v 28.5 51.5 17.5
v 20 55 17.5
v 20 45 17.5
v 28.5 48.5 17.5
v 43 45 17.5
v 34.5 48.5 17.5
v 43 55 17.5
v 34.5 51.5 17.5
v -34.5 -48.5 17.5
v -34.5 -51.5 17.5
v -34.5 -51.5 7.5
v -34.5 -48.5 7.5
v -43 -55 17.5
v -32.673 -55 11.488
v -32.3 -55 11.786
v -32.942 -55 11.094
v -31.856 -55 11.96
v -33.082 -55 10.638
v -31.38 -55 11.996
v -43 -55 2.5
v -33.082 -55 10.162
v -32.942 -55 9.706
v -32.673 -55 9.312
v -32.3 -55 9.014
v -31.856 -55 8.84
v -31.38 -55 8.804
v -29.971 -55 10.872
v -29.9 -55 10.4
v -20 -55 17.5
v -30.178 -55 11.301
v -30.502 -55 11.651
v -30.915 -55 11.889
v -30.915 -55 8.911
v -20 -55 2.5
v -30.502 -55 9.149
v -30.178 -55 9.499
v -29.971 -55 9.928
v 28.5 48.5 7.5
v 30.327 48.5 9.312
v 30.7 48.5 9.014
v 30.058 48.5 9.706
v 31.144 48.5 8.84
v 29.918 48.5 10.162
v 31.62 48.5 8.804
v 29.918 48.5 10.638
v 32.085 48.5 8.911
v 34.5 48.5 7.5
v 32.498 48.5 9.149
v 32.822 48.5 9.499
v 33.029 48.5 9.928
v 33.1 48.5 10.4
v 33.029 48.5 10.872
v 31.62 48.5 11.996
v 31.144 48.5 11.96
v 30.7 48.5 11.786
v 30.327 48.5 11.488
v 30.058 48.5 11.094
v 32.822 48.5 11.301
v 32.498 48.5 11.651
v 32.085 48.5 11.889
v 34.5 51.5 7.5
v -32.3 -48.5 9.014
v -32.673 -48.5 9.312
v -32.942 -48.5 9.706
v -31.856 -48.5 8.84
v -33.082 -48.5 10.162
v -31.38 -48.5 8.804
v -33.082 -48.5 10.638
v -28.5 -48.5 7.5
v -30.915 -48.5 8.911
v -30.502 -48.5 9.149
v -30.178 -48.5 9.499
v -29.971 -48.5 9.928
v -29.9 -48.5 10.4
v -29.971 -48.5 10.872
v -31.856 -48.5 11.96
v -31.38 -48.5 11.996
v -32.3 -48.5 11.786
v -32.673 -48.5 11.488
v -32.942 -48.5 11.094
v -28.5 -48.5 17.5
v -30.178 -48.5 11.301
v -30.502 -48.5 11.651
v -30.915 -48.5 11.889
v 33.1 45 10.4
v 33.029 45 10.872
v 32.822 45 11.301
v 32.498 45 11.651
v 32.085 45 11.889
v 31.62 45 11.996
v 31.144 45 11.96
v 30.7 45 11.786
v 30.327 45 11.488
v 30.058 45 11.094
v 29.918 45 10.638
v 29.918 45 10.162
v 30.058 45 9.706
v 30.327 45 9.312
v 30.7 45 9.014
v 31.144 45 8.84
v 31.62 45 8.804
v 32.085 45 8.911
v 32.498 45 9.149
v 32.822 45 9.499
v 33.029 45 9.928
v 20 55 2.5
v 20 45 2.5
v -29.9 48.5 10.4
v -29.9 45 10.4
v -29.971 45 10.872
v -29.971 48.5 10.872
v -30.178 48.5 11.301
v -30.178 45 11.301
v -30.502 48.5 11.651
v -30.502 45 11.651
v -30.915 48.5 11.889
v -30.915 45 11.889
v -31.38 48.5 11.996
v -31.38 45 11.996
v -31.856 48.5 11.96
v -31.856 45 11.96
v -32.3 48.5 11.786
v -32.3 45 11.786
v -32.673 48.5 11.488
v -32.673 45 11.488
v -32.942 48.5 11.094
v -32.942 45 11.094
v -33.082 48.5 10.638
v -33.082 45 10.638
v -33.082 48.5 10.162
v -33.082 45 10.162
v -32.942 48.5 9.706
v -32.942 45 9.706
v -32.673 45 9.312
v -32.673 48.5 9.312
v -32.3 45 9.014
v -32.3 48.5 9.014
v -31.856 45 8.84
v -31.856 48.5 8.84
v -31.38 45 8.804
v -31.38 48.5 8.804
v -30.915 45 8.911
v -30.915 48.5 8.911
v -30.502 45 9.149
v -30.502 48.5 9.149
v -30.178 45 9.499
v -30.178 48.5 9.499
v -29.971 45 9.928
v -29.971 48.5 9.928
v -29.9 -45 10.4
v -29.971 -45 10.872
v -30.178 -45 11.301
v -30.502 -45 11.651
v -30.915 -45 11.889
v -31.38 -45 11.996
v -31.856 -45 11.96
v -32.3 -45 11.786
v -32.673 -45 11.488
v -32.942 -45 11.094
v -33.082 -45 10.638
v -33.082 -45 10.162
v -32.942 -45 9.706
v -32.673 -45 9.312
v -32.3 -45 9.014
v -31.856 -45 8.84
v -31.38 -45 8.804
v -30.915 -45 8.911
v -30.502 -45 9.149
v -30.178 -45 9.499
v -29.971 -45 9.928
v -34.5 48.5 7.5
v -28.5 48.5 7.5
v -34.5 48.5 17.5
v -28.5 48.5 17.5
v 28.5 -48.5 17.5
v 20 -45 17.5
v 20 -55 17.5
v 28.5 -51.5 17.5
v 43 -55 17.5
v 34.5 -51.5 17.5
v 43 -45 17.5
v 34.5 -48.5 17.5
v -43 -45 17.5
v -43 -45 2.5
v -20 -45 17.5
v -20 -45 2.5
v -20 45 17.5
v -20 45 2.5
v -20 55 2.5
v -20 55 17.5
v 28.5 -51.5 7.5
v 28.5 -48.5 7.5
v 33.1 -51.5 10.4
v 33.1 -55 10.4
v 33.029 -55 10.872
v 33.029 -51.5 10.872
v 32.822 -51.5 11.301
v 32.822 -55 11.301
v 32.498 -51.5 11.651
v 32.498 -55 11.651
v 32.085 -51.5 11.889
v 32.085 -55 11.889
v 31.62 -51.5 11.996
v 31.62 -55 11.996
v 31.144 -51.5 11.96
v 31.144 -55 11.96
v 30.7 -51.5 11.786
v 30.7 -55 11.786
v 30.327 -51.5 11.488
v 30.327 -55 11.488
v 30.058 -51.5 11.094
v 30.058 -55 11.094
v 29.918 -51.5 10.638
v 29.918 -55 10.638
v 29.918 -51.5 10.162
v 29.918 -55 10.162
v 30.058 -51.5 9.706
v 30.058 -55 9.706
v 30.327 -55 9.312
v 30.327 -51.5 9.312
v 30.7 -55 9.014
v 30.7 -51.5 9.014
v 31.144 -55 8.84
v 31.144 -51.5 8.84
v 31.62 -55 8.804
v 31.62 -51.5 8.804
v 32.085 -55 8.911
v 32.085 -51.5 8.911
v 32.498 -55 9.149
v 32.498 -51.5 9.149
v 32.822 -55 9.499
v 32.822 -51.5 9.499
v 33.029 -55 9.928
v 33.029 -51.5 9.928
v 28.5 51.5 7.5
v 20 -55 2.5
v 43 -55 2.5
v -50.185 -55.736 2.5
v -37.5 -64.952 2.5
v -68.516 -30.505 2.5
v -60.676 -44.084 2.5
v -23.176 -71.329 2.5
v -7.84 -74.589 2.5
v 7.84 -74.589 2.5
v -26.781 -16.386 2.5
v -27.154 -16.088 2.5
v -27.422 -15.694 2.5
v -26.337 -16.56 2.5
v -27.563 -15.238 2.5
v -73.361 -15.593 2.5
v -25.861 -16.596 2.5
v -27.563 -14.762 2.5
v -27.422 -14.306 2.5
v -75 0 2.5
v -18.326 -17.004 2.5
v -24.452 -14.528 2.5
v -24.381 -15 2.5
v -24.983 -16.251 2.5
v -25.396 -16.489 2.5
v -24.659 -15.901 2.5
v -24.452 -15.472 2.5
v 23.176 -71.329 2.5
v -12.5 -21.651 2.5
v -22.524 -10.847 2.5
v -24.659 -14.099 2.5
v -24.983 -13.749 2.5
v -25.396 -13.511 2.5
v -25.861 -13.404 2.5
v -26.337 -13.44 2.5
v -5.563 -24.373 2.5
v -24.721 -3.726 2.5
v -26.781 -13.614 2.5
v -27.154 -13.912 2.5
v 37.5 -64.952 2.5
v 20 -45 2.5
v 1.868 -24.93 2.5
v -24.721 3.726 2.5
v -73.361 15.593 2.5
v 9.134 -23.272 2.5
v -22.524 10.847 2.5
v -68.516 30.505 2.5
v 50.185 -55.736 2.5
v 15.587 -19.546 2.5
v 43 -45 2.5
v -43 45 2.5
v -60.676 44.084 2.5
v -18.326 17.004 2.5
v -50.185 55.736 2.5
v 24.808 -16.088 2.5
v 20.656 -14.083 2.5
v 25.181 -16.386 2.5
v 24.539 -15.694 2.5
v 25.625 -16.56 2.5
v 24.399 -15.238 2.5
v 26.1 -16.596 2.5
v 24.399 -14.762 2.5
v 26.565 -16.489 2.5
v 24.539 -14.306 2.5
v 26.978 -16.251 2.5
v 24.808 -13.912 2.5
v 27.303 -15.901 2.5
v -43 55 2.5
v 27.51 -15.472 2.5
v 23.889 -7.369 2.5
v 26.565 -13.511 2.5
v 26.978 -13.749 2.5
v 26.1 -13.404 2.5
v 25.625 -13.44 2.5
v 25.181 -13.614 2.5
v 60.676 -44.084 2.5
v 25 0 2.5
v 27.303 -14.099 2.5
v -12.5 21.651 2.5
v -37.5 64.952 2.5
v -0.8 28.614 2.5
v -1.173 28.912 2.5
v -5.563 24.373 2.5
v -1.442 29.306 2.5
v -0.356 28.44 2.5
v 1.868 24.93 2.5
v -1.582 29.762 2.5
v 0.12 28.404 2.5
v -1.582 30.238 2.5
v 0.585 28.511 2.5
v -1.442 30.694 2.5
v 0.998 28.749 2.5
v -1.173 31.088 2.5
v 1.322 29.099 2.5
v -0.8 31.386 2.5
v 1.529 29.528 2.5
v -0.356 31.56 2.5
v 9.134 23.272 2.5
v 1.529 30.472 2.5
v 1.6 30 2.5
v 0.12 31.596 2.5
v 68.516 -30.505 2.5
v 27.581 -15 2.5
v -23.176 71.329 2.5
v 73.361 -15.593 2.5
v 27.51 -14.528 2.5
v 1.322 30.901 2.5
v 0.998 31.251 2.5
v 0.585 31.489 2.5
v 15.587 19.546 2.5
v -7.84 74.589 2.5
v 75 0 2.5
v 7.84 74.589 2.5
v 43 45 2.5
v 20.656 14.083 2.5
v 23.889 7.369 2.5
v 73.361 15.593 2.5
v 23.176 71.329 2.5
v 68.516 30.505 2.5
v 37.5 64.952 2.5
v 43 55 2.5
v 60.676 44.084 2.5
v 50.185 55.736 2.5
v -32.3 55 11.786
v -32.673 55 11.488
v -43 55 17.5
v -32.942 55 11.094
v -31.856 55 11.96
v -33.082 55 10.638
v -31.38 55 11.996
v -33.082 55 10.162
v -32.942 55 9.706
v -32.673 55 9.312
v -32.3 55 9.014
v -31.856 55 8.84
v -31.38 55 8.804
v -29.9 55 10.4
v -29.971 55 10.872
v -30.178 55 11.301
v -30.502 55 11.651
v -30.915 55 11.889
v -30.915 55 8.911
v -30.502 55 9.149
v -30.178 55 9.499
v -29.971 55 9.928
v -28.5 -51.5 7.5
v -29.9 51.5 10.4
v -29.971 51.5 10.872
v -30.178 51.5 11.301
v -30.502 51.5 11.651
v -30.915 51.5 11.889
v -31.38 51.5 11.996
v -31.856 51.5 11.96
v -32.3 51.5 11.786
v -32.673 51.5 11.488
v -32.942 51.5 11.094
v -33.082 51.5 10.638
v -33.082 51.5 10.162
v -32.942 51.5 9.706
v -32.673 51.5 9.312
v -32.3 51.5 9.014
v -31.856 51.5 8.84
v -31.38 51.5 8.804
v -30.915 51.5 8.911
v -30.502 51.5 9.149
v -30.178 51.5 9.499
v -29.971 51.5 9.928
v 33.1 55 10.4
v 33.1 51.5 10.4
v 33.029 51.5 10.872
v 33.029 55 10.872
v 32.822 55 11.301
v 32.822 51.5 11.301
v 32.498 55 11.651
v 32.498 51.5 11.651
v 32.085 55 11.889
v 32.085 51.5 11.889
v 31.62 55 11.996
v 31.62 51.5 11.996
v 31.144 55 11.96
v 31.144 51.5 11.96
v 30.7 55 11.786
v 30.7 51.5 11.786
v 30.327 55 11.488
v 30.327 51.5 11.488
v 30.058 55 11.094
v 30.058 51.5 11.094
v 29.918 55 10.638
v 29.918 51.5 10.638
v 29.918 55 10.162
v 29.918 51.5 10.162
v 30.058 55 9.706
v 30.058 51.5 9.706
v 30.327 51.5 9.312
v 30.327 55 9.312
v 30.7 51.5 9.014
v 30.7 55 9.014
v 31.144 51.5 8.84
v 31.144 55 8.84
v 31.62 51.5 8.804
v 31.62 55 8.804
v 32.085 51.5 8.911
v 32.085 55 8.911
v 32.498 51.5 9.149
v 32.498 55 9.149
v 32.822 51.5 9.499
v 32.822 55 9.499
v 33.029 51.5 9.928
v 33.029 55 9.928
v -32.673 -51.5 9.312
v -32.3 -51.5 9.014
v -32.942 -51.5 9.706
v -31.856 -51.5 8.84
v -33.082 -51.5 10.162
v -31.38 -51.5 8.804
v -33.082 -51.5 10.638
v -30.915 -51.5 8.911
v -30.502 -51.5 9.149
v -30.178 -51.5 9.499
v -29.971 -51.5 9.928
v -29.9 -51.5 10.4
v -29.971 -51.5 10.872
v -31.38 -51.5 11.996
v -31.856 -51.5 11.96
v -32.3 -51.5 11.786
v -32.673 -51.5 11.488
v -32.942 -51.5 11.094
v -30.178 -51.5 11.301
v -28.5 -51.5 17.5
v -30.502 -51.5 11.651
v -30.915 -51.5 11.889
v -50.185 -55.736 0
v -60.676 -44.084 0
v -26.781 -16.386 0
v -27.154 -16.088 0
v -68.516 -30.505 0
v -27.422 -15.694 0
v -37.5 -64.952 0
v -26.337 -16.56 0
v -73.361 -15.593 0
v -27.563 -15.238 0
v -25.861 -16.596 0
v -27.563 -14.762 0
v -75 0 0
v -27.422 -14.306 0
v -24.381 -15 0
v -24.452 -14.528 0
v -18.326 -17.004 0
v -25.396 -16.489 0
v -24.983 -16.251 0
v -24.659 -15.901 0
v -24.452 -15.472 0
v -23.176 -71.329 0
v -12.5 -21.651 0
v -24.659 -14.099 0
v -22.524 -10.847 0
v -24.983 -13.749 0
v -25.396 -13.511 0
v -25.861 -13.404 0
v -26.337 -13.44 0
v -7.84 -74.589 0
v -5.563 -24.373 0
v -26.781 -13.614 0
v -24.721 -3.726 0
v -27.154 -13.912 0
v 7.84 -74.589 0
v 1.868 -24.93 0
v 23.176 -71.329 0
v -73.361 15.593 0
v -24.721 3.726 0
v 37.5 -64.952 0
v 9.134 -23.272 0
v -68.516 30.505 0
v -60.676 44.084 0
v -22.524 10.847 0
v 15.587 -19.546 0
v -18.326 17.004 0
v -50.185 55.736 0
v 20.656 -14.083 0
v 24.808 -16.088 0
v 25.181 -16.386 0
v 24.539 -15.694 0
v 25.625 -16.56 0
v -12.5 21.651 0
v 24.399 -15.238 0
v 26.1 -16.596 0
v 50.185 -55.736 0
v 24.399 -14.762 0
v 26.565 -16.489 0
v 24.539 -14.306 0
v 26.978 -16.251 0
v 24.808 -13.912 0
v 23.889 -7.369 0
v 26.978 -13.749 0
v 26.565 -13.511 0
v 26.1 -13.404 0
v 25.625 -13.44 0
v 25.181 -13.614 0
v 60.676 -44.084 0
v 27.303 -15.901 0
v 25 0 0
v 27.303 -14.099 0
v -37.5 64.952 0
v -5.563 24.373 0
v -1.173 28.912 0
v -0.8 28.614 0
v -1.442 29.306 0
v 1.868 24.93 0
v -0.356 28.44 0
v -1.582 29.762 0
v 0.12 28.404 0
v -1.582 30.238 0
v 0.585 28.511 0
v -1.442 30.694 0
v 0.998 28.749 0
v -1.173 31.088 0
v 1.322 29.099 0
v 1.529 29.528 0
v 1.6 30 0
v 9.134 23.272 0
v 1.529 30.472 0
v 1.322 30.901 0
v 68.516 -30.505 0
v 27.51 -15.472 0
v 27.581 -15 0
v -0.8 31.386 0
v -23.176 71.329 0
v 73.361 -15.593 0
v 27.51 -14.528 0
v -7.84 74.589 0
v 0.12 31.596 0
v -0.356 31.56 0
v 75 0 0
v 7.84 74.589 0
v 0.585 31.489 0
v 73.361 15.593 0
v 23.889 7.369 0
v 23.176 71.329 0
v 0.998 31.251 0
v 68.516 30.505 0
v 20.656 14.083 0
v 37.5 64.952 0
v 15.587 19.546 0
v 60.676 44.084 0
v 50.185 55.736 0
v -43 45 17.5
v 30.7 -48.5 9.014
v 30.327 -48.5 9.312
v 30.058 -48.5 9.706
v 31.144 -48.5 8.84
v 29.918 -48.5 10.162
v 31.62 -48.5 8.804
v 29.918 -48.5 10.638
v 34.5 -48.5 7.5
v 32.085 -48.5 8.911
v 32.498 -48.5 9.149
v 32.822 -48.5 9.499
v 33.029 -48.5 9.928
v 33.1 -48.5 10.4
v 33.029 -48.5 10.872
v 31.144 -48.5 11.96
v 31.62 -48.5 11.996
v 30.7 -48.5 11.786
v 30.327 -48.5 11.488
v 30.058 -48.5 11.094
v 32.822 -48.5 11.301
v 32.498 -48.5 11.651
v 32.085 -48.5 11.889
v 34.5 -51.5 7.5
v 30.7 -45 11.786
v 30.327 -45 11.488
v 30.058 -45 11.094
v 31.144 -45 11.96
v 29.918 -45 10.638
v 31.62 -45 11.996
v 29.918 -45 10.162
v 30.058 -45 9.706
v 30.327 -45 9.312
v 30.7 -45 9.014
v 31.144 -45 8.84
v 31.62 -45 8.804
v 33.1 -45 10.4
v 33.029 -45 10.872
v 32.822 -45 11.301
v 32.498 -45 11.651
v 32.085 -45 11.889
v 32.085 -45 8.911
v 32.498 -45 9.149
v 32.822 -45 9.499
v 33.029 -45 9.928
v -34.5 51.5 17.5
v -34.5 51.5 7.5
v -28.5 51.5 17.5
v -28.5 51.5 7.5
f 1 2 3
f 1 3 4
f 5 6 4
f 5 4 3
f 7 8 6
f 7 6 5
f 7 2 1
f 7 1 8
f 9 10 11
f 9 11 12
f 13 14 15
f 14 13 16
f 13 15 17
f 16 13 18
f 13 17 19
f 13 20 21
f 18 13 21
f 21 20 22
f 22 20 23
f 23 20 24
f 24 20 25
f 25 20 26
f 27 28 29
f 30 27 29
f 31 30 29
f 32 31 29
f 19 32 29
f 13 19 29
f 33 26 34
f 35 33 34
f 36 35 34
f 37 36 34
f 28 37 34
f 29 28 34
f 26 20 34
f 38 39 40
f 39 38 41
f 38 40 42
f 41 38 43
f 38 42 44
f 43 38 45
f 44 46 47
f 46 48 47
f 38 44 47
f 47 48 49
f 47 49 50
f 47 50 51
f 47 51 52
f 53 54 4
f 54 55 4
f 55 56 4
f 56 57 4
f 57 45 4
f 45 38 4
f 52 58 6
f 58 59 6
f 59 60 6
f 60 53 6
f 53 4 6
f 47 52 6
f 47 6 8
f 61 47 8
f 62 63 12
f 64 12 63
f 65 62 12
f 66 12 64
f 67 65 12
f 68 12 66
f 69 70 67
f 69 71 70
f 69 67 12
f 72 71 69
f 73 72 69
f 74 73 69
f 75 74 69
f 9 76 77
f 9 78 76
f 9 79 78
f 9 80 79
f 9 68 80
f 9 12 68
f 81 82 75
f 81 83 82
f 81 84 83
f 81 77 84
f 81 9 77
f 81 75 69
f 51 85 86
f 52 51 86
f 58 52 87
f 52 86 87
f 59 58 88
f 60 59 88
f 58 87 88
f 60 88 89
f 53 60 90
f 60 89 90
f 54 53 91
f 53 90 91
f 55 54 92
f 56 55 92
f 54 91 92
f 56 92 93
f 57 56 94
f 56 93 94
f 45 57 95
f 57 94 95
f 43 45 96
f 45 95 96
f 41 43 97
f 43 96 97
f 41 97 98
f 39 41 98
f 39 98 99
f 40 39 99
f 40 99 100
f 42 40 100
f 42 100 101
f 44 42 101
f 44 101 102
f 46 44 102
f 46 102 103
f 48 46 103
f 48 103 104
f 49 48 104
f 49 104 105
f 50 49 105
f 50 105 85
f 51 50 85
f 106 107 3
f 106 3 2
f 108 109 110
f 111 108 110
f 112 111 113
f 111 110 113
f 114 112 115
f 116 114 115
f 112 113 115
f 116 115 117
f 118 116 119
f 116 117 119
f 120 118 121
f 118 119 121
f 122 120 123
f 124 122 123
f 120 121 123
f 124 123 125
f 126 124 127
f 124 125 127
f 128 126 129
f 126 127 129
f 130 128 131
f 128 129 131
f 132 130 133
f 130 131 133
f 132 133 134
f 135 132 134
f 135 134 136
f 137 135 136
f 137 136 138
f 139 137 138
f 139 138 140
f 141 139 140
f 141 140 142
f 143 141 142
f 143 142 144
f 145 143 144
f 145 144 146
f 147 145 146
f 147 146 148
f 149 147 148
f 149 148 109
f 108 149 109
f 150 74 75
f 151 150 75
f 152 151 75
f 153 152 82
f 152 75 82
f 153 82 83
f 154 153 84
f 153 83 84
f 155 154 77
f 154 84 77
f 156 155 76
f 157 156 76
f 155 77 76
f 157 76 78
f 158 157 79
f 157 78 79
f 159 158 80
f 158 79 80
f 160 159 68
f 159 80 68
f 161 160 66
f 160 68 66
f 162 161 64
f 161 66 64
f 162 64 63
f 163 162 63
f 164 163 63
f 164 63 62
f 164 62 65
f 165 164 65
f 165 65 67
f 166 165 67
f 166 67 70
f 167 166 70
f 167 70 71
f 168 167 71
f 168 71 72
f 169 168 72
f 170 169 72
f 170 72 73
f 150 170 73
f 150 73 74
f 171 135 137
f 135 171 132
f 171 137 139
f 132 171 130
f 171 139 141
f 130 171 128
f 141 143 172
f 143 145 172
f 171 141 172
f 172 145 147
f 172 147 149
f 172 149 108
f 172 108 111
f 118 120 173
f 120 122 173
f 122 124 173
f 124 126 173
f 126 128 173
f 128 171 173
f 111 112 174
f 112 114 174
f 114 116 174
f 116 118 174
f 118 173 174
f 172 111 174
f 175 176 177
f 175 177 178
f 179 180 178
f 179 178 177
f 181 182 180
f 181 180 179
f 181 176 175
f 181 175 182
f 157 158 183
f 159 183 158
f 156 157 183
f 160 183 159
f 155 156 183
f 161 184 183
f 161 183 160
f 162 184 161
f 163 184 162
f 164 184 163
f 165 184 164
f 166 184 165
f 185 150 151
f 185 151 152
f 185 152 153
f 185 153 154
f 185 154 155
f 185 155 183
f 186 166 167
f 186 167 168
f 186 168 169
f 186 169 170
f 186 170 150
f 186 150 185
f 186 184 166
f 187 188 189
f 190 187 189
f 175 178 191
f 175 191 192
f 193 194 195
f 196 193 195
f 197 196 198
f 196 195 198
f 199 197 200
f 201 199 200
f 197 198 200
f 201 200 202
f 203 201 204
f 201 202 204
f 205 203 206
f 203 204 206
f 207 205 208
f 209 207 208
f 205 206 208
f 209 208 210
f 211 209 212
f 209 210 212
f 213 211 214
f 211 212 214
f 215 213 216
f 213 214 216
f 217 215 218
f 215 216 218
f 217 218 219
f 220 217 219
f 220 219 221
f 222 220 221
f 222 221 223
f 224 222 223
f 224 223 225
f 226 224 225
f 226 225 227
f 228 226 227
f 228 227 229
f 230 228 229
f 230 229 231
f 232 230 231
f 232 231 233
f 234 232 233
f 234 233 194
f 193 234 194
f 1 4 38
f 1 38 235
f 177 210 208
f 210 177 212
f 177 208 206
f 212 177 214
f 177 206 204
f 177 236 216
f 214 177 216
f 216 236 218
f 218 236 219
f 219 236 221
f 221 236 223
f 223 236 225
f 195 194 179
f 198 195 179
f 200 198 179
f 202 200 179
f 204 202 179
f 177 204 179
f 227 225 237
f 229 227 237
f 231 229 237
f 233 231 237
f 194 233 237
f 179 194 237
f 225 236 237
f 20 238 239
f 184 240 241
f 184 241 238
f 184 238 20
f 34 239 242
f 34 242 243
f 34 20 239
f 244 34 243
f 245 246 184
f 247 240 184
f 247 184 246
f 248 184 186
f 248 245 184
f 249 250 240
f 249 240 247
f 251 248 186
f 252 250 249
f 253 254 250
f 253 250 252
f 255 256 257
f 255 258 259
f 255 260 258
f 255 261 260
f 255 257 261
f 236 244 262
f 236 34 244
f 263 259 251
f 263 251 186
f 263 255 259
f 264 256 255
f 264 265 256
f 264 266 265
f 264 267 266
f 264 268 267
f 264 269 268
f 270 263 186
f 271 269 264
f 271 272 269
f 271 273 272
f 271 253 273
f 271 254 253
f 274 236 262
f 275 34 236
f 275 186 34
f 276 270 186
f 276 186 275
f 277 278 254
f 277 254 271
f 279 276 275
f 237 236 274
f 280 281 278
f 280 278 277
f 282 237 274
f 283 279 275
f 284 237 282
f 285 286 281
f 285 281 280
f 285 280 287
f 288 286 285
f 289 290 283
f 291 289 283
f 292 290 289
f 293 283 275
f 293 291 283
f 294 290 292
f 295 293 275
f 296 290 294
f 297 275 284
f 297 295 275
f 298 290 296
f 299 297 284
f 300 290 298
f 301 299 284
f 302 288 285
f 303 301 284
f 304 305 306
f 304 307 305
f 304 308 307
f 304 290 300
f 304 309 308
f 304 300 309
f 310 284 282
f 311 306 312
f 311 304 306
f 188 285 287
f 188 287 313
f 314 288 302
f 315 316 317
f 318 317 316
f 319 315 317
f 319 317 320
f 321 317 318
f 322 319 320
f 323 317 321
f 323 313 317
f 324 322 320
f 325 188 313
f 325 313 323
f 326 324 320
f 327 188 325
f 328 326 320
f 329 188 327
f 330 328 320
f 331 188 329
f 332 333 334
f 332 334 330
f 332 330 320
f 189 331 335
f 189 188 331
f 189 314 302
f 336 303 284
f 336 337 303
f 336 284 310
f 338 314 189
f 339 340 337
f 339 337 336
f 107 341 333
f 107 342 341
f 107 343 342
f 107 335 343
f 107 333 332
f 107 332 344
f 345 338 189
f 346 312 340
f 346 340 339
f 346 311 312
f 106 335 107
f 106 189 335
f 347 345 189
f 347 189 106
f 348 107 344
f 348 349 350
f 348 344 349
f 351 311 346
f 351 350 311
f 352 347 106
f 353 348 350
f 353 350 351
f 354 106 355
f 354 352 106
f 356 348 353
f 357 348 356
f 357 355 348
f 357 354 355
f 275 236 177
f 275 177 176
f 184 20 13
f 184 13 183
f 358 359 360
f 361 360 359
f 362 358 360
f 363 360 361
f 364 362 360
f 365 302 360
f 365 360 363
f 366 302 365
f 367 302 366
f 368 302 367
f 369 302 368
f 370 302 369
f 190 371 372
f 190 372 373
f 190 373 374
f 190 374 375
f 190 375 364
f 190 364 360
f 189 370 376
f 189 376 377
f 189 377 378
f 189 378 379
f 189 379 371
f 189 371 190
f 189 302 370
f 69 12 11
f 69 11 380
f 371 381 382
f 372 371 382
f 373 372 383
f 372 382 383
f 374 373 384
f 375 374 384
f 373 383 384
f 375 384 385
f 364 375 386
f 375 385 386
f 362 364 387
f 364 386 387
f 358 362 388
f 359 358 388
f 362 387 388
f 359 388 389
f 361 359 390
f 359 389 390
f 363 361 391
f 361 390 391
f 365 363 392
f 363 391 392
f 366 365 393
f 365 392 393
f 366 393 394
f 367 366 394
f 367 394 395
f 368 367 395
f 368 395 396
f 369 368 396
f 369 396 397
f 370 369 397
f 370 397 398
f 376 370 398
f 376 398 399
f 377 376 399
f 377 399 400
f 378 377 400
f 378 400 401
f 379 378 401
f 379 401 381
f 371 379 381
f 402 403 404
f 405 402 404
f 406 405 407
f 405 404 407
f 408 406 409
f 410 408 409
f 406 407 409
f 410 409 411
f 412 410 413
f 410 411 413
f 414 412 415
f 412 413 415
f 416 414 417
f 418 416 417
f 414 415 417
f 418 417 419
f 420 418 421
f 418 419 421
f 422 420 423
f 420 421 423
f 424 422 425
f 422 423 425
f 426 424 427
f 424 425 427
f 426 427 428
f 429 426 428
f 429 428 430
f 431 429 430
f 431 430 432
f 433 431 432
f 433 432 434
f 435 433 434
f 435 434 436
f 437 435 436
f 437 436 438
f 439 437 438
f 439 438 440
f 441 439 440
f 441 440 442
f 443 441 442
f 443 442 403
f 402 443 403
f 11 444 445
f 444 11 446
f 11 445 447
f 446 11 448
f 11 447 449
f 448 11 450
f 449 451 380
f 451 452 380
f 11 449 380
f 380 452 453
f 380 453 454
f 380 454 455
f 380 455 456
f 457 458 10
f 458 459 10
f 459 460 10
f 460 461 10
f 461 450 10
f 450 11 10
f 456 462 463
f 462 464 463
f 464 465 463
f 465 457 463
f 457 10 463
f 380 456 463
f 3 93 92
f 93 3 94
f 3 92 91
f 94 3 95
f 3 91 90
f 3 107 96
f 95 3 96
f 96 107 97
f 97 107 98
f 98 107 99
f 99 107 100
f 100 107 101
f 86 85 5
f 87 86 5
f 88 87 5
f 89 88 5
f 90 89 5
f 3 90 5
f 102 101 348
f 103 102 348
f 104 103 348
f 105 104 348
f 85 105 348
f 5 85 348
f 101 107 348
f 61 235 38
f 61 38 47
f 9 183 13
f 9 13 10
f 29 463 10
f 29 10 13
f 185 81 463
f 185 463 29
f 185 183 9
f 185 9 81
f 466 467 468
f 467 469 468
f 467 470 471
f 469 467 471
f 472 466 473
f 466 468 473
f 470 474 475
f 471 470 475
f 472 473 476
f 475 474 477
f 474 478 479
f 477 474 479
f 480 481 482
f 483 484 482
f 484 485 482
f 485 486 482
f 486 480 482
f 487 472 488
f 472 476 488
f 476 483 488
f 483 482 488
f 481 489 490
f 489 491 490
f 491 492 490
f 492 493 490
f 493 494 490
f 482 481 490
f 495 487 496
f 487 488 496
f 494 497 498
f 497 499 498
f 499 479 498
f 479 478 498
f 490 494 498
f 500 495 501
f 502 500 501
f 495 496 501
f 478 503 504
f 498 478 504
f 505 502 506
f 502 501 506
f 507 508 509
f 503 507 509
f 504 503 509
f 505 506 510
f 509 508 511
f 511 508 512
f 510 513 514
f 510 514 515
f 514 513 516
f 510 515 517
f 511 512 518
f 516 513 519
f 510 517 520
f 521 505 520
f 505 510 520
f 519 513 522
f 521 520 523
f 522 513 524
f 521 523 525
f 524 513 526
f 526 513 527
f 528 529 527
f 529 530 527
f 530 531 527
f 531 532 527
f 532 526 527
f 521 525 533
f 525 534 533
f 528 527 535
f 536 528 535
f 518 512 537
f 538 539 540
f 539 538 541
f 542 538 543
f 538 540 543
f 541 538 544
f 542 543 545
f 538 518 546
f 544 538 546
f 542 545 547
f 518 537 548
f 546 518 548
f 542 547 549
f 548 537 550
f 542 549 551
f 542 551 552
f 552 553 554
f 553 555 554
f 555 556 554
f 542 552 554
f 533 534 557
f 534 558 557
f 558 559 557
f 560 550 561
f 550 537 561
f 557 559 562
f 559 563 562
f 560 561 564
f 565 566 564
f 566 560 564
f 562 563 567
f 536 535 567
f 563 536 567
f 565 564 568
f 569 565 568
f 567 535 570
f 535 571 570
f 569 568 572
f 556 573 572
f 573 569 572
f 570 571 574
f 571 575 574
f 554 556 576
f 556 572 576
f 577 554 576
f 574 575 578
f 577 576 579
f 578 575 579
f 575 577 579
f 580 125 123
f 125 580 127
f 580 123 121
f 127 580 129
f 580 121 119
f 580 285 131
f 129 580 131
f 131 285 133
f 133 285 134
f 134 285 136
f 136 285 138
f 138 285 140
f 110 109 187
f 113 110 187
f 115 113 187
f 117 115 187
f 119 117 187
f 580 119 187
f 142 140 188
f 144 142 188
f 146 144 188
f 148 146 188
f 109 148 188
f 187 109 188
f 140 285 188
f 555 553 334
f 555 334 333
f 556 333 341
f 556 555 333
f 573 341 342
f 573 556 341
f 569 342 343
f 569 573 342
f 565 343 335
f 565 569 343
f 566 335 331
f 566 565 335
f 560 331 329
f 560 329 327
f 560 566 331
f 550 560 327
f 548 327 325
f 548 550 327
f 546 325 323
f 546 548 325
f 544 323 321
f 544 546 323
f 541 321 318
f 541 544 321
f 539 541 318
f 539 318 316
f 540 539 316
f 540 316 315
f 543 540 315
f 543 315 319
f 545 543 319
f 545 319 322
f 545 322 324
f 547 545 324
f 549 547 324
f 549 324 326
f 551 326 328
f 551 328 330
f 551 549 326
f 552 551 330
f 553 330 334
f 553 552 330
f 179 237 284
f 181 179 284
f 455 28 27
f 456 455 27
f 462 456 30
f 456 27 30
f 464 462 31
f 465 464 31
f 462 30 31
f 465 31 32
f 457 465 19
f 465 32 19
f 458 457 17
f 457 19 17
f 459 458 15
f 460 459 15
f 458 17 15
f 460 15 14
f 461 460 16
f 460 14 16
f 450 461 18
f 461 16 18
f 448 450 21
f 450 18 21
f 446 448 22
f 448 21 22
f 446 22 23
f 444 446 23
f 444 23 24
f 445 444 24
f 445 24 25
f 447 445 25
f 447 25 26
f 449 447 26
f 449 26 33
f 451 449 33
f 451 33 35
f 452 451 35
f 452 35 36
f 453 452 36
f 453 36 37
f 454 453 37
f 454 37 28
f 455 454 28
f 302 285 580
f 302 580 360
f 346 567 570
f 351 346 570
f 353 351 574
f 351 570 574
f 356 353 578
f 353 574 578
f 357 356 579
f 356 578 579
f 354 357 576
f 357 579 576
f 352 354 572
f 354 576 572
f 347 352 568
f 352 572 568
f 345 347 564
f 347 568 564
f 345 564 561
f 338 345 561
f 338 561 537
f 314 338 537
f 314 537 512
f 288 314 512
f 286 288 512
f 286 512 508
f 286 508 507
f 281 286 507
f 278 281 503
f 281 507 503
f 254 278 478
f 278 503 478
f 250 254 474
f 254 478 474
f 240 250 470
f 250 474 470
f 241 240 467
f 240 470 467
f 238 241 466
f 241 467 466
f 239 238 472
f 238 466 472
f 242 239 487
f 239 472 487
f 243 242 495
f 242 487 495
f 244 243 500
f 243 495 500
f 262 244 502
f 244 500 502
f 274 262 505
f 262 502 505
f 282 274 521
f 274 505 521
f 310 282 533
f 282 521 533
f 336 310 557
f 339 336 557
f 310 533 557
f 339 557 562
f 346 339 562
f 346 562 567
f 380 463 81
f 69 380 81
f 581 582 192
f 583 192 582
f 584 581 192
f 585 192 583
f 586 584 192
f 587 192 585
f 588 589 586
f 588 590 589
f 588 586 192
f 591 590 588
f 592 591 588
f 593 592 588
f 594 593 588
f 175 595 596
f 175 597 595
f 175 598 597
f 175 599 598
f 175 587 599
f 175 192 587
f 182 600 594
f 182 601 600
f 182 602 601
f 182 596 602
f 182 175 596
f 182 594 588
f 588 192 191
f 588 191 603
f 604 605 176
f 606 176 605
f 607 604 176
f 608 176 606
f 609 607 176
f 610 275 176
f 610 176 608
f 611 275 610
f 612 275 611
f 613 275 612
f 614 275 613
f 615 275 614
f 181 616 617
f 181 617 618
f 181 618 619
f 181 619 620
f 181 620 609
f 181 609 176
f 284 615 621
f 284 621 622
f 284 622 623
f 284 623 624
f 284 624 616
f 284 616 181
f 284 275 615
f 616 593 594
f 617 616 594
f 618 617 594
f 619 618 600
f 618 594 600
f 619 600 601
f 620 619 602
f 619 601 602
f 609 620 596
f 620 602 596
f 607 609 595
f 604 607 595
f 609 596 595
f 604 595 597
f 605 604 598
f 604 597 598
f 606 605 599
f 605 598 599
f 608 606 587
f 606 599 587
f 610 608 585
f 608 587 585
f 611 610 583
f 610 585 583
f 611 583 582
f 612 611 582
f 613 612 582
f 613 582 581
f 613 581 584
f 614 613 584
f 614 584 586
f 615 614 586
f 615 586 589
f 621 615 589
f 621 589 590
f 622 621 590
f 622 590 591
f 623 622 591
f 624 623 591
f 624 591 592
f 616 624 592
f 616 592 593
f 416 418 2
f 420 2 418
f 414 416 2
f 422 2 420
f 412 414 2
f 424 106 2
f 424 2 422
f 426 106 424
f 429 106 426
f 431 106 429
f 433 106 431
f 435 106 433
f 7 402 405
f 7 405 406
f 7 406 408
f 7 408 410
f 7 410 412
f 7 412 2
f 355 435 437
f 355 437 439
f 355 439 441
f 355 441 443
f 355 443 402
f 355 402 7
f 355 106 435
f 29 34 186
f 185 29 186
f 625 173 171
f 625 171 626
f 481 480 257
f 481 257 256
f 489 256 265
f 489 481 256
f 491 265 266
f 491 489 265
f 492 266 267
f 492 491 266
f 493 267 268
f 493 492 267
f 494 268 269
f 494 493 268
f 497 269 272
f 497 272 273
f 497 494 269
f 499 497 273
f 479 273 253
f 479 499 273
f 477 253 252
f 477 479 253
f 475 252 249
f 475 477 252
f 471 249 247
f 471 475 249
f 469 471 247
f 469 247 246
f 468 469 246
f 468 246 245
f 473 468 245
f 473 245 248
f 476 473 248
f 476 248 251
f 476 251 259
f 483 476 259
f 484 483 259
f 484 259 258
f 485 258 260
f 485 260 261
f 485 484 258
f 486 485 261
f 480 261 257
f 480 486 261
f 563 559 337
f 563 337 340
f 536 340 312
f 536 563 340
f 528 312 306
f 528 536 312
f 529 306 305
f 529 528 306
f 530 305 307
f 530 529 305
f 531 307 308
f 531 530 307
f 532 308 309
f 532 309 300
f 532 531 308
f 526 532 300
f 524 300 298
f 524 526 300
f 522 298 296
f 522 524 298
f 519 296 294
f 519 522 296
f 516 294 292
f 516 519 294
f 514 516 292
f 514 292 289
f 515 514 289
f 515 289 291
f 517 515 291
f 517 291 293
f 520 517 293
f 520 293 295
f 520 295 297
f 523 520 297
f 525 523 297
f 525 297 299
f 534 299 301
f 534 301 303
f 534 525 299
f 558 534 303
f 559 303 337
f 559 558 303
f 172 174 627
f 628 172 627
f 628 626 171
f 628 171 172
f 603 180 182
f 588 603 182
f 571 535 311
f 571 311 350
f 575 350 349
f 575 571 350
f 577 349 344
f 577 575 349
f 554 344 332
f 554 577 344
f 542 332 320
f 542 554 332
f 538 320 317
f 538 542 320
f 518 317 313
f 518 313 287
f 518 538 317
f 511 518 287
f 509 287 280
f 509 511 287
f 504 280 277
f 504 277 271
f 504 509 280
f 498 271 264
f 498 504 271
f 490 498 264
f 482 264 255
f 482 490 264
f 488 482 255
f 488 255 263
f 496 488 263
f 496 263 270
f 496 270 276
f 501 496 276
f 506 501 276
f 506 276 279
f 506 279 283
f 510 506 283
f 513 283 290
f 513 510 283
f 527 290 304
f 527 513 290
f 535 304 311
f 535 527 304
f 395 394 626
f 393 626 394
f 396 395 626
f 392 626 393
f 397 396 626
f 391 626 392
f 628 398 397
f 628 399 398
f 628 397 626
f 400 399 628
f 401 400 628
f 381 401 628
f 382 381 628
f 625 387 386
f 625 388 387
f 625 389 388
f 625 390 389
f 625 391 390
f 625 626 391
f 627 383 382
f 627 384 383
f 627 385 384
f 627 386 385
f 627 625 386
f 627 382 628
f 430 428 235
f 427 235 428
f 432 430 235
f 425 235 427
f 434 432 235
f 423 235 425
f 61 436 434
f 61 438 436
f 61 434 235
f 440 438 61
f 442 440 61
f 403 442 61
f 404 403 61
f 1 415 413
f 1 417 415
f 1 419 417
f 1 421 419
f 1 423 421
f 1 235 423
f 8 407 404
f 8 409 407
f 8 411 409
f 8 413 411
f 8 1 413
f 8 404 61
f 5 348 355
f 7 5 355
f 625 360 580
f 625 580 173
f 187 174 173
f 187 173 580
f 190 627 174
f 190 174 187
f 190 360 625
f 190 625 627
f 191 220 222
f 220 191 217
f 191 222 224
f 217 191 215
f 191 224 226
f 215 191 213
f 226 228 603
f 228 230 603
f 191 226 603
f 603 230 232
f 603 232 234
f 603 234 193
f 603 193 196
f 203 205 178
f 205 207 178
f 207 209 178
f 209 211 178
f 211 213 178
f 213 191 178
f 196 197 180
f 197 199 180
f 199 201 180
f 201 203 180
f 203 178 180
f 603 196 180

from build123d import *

# Parameters (mm, degrees)
SKETCH_R        = 75
SKETCH_R_2      = 25
SKETCH_R_3      = 1.6
PAD_DEPTH       = 2.5
SKETCH001_W     = 23
SKETCH001_H     = 10
PAD001_DEPTH    = 15
SKETCH002_R     = 1.6
POCKET_DEPTH    = 130.001
SKETCH003_W     = 6
SKETCH003_H     = 3
POCKET001_DEPTH = 10


with BuildPart() as part:
    # Sketch → Pad (new body)
    with BuildSketch(Plane.XY):
        Circle(SKETCH_R)
        Circle(SKETCH_R_2, mode=Mode.SUBTRACT)
        with Locations((0, 30)):
            Circle(SKETCH_R_3, mode=Mode.SUBTRACT)
        with Locations((-25.980762, -15)):
            Circle(SKETCH_R_3, mode=Mode.SUBTRACT)
        with Locations((25.980762, -15)):
            Circle(SKETCH_R_3, mode=Mode.SUBTRACT)
    extrude(amount=PAD_DEPTH)

    # Sketch001 → Pad001 (new body)
    with BuildSketch(Plane.XY.offset(2.5)):
        with Locations((-31.5, 50)):
            Rectangle(SKETCH001_W, SKETCH001_H)
        with Locations((31.5, 50)):
            Rectangle(SKETCH001_W, SKETCH001_H)
        with Locations((-31.5, -50)):
            Rectangle(SKETCH001_W, SKETCH001_H)
        with Locations((31.5, -50)):
            Rectangle(SKETCH001_W, SKETCH001_H)
    extrude(amount=PAD001_DEPTH)

    # Sketch002 → Pocket (cut, through all)
    with BuildSketch(Plane.XZ.offset(55)):
        with Locations((31.5, 10.4)):
            Circle(SKETCH002_R)
        with Locations((-31.5, 10.4)):
            Circle(SKETCH002_R)
    extrude(amount=-POCKET_DEPTH, mode=Mode.SUBTRACT)

    # Sketch003 → Pocket001 (cut)
    with BuildSketch(Plane.XY.offset(17.5)):
        with Locations((31.5, -50)):
            Rectangle(SKETCH003_W, SKETCH003_H)
        with Locations((-31.5, -50)):
            Rectangle(SKETCH003_W, SKETCH003_H)
        with Locations((31.5, 50)):
            Rectangle(SKETCH003_W, SKETCH003_H)
        with Locations((-31.5, 50)):
            Rectangle(SKETCH003_W, SKETCH003_H)
    extrude(amount=-POCKET001_DEPTH, mode=Mode.SUBTRACT)


solid = part.part
